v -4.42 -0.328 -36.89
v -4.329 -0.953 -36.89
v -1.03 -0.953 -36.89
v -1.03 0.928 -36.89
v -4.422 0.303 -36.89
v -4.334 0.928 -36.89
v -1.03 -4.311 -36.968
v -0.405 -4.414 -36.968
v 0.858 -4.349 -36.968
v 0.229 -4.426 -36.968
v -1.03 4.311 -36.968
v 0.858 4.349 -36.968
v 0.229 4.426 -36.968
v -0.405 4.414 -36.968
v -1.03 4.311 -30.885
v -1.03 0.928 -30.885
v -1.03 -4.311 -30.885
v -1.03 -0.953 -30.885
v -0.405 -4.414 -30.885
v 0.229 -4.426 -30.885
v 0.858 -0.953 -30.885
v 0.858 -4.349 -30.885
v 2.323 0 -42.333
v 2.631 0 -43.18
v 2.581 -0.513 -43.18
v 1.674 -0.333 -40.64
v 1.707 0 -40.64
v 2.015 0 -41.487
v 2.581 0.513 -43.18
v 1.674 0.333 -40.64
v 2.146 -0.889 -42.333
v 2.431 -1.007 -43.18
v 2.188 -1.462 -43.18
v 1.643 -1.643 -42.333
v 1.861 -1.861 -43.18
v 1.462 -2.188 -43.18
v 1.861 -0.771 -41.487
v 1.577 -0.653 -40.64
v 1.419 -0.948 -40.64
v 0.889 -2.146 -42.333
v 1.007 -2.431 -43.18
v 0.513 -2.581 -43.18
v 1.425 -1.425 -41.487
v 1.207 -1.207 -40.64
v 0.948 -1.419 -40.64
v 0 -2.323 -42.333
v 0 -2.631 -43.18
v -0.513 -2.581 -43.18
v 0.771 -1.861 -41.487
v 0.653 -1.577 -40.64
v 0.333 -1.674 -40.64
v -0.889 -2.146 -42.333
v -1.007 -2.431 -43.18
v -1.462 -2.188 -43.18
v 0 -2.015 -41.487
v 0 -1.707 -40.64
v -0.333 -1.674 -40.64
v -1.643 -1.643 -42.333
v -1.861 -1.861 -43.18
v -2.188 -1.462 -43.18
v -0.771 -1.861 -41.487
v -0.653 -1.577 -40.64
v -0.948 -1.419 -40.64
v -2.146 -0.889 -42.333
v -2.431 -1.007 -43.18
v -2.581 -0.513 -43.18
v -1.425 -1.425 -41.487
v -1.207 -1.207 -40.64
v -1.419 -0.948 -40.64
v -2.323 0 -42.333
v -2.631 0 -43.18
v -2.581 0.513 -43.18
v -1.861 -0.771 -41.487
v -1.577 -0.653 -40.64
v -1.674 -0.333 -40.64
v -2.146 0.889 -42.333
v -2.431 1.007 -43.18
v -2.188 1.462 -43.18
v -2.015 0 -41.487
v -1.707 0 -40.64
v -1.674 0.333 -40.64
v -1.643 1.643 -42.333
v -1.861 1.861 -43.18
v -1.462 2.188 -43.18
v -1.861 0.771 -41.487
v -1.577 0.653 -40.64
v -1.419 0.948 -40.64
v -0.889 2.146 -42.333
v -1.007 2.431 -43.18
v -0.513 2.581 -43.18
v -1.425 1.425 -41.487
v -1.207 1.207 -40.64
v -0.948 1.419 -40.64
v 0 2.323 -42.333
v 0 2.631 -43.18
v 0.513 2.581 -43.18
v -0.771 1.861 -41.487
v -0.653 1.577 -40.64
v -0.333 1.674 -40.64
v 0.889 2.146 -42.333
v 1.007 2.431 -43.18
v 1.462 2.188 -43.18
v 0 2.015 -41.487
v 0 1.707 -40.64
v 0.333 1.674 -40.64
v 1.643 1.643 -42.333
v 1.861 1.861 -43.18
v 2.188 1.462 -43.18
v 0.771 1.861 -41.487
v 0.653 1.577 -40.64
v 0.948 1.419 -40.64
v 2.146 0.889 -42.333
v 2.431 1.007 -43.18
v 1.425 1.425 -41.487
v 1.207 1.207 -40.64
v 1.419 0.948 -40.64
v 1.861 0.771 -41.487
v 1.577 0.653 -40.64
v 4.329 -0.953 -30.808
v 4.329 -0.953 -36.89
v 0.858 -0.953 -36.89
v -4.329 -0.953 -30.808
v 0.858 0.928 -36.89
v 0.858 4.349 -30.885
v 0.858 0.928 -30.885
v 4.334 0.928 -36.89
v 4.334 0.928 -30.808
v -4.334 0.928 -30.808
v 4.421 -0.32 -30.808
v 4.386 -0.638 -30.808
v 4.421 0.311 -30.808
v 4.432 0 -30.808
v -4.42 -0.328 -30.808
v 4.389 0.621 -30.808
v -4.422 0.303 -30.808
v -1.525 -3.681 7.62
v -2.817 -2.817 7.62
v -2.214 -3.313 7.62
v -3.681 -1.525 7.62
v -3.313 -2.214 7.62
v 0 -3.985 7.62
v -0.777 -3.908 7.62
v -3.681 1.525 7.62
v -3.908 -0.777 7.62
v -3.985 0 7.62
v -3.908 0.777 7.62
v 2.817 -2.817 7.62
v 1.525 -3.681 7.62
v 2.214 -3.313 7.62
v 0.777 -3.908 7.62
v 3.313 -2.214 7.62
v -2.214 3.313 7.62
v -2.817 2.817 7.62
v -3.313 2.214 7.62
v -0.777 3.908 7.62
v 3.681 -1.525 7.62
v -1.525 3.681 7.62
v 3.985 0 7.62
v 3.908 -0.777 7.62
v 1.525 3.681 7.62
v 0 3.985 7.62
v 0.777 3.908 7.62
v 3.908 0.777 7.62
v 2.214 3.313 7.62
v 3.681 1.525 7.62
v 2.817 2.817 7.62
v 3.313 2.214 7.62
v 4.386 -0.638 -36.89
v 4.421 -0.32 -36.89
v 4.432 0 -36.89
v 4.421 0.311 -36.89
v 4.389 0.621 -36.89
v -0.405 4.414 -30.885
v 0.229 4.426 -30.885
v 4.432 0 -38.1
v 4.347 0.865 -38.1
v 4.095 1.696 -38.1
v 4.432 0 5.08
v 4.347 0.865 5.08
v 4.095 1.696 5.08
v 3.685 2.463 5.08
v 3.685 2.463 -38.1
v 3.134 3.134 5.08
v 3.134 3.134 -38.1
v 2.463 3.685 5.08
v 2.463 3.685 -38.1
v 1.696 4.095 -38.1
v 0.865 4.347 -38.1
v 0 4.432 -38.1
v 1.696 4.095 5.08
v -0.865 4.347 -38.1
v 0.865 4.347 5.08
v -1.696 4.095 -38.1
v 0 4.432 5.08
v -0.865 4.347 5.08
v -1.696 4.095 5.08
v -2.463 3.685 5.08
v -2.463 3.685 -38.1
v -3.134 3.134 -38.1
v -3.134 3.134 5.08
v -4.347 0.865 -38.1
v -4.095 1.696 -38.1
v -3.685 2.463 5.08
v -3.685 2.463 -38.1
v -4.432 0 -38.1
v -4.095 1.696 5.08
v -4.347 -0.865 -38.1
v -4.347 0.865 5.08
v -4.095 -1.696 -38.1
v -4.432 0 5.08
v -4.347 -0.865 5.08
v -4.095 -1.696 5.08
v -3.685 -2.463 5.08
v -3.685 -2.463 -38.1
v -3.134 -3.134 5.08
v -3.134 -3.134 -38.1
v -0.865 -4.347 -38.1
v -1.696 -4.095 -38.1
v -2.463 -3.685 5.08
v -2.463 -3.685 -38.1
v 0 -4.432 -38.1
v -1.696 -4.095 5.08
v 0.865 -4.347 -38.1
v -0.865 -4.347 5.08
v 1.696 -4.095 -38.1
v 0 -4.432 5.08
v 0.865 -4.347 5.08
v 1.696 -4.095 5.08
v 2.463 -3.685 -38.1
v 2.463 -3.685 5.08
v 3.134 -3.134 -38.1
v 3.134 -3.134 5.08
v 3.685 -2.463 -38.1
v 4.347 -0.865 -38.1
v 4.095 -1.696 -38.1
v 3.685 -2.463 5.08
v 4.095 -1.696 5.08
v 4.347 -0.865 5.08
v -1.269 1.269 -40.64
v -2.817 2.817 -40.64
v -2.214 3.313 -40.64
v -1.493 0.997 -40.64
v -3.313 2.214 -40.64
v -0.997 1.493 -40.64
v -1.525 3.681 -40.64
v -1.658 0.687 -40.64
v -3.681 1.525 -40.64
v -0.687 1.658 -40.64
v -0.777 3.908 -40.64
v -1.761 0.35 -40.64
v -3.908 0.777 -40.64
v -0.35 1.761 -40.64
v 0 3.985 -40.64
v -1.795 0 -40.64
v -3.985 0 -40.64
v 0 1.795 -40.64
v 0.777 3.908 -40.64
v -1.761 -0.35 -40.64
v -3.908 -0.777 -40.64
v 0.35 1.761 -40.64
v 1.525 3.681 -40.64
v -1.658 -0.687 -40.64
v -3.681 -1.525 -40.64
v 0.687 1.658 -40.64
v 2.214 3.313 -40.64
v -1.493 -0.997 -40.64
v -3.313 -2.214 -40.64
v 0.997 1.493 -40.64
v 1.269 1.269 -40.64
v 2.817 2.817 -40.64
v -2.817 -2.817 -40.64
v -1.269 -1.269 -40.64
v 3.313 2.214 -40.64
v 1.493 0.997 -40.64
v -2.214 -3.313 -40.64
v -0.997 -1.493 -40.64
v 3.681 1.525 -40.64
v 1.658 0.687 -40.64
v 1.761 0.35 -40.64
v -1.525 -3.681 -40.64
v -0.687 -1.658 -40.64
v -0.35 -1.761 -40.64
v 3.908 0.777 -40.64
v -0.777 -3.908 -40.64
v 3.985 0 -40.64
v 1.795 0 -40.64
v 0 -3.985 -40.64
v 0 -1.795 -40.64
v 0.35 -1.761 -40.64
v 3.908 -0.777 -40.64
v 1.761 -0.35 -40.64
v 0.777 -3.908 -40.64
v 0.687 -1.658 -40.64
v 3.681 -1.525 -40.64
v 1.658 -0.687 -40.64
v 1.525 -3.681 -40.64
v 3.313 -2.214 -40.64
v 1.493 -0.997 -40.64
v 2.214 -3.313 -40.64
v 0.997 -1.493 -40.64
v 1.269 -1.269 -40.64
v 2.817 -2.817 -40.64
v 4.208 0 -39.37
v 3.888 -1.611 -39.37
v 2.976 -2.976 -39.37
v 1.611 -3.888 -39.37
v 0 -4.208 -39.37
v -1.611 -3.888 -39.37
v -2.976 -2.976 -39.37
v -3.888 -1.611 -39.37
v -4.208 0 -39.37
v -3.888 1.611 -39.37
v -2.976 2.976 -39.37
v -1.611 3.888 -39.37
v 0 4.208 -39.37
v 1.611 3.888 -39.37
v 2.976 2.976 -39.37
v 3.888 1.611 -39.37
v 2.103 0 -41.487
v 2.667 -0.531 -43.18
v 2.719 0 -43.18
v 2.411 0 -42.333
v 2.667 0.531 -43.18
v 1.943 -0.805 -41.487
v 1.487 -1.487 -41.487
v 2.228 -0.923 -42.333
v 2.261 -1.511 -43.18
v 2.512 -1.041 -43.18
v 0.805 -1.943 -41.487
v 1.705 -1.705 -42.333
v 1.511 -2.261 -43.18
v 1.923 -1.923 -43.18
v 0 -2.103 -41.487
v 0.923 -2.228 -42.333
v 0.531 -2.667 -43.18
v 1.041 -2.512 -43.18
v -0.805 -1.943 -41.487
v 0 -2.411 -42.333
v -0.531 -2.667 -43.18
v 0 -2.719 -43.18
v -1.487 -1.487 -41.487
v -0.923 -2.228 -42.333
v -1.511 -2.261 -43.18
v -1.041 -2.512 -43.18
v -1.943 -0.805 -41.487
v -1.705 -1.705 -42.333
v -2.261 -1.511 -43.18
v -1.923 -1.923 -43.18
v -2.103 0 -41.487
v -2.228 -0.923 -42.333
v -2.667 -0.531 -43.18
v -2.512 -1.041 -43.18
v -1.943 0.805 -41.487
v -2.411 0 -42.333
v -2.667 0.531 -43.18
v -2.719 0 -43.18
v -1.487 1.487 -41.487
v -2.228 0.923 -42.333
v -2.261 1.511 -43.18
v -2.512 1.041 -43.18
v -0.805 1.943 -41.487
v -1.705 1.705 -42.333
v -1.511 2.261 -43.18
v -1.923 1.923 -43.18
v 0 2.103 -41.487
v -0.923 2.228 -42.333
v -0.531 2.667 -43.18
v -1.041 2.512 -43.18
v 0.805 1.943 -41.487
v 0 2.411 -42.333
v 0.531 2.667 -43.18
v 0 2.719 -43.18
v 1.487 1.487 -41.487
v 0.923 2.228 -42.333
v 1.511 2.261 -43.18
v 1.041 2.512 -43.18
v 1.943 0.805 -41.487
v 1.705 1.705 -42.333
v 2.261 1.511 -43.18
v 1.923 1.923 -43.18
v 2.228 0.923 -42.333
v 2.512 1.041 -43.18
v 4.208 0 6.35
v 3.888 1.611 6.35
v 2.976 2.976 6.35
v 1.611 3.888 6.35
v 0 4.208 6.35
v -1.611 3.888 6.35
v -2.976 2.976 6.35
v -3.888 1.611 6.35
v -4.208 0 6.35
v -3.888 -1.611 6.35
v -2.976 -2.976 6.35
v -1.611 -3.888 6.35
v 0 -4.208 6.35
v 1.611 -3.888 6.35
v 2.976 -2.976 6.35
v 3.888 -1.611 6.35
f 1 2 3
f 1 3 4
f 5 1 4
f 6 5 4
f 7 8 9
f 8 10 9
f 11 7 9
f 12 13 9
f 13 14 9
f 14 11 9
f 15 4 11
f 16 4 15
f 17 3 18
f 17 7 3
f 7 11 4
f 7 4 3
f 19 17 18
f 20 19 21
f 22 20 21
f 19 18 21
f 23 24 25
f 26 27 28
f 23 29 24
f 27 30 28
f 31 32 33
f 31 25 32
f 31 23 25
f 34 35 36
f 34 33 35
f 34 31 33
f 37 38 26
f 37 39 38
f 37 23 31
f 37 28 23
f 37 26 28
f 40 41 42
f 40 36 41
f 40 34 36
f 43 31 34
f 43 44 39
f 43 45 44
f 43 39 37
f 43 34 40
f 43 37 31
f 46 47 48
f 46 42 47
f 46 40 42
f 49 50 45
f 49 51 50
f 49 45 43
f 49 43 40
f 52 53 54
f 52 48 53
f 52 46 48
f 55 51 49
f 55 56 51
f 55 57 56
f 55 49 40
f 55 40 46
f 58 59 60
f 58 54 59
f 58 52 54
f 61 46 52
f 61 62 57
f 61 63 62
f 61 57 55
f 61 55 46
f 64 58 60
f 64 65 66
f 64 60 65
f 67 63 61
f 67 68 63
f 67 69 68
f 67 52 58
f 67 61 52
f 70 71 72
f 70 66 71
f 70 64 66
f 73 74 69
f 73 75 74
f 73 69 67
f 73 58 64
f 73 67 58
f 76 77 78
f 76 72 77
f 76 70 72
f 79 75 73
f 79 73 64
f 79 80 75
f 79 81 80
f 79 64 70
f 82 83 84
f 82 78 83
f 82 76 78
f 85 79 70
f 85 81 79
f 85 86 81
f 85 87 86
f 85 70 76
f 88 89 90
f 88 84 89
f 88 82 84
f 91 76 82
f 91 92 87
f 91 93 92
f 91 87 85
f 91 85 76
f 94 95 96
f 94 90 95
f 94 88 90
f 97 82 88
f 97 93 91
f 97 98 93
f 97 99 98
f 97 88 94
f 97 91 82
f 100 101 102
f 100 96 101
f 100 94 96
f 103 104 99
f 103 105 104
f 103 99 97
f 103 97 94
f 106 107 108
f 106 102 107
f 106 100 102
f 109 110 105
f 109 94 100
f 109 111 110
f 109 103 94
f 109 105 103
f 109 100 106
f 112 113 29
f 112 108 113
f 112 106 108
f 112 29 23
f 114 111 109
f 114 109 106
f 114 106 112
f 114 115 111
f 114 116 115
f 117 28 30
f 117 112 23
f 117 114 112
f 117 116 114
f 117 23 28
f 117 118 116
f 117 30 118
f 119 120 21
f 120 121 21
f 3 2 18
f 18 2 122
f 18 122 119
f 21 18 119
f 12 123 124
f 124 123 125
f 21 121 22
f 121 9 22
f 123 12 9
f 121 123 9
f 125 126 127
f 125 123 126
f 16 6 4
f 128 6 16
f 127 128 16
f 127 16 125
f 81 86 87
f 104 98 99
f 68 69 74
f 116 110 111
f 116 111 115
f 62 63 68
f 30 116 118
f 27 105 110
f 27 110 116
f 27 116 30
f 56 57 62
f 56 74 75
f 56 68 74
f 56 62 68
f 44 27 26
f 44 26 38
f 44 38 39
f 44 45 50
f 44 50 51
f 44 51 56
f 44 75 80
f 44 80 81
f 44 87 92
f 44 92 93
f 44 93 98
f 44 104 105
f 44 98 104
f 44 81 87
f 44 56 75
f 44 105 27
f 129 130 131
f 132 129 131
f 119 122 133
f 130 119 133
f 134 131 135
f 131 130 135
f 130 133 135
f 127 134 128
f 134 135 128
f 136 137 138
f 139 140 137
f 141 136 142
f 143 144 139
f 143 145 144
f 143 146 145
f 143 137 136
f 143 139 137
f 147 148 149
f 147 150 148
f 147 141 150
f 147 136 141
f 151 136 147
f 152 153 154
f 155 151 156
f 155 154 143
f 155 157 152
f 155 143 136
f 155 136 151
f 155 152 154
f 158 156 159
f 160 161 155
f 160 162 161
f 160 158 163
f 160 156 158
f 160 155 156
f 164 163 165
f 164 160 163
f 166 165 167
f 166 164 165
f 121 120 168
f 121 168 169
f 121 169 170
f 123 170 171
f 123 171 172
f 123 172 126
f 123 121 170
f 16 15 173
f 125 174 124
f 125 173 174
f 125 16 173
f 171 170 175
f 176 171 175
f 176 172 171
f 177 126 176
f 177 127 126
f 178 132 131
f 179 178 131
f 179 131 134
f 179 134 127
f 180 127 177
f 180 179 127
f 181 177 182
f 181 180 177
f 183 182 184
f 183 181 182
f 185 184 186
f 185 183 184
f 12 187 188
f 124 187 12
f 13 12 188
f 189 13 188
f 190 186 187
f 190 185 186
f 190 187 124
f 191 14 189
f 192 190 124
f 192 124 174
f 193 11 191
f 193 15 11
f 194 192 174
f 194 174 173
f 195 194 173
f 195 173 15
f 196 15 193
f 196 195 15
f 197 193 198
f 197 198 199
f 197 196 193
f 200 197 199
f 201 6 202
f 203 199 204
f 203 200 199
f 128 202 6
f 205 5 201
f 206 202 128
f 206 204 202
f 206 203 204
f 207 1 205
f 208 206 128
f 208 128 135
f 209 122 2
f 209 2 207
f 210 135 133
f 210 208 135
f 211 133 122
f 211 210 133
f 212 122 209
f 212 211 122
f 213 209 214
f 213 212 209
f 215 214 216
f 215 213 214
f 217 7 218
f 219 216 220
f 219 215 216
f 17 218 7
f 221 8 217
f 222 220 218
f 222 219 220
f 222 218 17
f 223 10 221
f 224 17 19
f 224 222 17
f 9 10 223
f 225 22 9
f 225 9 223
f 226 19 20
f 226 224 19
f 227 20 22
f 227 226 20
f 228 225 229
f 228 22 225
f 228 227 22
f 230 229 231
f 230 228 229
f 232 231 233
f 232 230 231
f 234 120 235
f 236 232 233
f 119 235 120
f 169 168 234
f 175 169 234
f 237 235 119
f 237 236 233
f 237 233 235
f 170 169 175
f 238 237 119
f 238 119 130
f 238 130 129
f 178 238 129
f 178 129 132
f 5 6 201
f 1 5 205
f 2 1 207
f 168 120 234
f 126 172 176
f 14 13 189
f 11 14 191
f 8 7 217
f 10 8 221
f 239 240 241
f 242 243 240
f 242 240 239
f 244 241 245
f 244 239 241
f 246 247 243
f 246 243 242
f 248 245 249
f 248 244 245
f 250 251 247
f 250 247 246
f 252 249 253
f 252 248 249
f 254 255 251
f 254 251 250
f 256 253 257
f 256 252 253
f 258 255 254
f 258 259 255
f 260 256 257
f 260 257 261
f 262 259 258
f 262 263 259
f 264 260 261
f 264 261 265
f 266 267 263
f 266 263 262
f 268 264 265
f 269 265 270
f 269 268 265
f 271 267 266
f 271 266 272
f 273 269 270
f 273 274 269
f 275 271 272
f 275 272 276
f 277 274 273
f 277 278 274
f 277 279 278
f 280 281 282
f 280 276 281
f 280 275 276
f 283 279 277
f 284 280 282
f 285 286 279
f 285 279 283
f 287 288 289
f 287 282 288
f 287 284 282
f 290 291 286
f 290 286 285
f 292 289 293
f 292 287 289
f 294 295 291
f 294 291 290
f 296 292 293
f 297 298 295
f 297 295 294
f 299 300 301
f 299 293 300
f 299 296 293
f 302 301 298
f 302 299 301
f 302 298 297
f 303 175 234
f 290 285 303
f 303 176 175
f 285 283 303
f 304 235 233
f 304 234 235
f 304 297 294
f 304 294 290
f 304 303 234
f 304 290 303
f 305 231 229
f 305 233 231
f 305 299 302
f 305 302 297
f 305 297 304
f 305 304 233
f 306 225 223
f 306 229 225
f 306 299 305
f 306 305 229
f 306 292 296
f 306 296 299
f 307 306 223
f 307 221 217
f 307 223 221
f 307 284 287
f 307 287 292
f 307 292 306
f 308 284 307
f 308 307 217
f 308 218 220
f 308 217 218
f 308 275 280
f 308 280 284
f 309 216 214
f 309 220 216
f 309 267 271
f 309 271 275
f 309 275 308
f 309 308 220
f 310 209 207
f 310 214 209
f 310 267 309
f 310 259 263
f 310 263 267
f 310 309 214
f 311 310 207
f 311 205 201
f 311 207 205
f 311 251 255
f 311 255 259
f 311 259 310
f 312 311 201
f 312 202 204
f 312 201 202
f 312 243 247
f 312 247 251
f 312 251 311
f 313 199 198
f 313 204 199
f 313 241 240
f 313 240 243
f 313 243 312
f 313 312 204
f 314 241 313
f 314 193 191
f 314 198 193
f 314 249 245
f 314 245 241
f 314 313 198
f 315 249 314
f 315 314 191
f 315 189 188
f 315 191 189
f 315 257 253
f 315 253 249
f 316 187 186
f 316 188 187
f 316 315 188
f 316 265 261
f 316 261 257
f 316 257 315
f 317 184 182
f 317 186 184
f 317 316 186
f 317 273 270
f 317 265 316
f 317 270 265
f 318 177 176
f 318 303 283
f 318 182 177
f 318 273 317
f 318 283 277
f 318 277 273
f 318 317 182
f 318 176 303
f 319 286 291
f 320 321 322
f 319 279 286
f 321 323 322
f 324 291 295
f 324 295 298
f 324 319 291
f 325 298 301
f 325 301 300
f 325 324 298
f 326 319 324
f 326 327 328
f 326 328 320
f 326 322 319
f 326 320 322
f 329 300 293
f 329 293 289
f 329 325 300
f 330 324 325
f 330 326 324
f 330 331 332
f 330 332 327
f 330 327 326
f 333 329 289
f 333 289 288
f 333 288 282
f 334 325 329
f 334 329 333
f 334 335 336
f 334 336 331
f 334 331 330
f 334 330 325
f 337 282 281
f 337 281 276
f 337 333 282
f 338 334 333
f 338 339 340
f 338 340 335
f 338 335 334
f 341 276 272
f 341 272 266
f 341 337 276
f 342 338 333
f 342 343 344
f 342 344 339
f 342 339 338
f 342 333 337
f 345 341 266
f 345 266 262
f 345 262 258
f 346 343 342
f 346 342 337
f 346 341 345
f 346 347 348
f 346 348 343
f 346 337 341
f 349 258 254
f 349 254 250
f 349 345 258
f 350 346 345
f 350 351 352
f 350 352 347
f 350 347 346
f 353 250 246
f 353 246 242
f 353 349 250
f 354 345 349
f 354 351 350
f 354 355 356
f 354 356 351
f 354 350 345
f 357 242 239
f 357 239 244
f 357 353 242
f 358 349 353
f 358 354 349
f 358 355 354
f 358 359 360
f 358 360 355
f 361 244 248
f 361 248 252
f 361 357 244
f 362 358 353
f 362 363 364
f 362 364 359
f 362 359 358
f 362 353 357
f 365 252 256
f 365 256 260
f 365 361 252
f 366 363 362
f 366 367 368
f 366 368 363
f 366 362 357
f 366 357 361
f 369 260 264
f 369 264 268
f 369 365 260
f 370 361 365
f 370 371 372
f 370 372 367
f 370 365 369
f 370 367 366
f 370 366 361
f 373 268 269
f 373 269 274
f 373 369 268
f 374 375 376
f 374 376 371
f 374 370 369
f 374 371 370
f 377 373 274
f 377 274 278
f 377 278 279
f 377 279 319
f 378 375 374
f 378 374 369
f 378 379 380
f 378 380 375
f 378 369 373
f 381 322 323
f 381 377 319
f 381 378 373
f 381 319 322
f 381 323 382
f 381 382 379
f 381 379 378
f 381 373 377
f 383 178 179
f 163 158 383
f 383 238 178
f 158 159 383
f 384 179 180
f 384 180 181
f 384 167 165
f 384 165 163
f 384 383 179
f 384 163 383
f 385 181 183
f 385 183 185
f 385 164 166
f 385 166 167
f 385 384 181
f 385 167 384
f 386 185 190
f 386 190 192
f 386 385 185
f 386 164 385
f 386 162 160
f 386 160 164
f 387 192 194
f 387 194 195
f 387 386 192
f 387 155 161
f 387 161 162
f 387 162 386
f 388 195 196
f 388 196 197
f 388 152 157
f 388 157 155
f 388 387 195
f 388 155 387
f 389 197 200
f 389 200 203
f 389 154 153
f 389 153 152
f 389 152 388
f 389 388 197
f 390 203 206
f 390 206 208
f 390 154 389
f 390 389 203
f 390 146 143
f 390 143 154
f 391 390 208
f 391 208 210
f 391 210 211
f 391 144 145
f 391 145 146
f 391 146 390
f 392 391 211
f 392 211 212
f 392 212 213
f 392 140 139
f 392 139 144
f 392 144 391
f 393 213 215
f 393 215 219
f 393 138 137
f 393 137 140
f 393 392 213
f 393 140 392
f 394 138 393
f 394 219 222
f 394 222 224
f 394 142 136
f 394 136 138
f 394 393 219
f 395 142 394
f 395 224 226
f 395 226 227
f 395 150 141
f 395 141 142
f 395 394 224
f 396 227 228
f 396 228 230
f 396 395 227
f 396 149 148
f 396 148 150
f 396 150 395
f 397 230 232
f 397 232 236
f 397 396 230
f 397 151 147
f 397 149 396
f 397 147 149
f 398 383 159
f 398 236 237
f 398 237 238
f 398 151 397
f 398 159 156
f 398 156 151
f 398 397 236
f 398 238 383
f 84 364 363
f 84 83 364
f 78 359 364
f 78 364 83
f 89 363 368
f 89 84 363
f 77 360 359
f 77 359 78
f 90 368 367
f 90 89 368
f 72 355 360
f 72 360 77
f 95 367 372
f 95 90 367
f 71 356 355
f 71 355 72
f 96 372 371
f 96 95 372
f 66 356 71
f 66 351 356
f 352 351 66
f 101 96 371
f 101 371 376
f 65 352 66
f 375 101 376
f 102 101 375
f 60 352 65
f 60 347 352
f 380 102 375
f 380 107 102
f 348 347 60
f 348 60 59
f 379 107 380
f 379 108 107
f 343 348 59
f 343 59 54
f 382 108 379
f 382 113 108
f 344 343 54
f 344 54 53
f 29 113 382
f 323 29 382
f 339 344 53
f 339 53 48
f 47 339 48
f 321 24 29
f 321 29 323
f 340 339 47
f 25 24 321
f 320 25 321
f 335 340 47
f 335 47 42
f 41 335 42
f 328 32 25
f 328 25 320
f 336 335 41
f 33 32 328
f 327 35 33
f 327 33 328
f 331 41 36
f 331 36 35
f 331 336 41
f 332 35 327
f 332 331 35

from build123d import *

# Parameters (mm, degrees)
F0_R           = 4.4323867957
F1_DEPTH       = 5.08
F1_DEPTH_BACK  = 38.1
F1_FACE_R      = 4.4323867957
F2_DEPTH       = 2.54
F2_TAPER       = 10
F1_FACE1_R     = 4.4323867957
F3_DEPTH       = 2.54
F3_TAPER       = 10
F4_R           = 1.7950151947
F5_DEPTH       = 2.54
F5_TAPER       = -20
F6_R           = 2.6311933972
F7_DEPTH       = 2.54
F7_TAPER       = 20
F8_W           = 1.8805181608
F8_H           = 6.0816761106
F9_DEPTH       = 25.4
F9_DEPTH_BACK  = 25.4
F10_W          = 1.8878498813
F10_H          = 6.0830730945
F11_DEPTH      = 25.4
F11_DEPTH_BACK = 25.4


with BuildPart() as f1:
    # F0 (on Top) → F1 (new body, two sides)
    with BuildSketch(Plane.XY) as f1_sk:
        Circle(F0_R)
    extrude(amount=F1_DEPTH)
    extrude(f1_sk.sketch, amount=-F1_DEPTH_BACK)

    # F1_face (on face) → F2 (join)
    with BuildSketch(Plane(origin=(0, 0, -38.1), x_dir=(1, 0, 0), z_dir=(0, 0, -1))):
        Circle(F1_FACE_R)
    extrude(amount=F2_DEPTH, taper=F2_TAPER)

    # F1_face1 (on face) → F3 (join)
    with BuildSketch(Plane.XY.offset(5.08)):
        Circle(F1_FACE1_R)
    extrude(amount=F3_DEPTH, taper=F3_TAPER)

    # F4 (on face) → F5 (join)
    with BuildSketch(Plane(origin=(0, 0, -40.64), x_dir=(1, 0, 0), z_dir=(0, 0, -1))):
        Circle(F4_R)
    extrude(amount=F5_DEPTH, taper=F5_TAPER)

    # F6 (on face) → F7 (cut)
    with BuildSketch(Plane(origin=(0, 0, -43.18), x_dir=(1, 0, 0), z_dir=(0, 0, -1))):
        Circle(F6_R)
    extrude(amount=-F7_DEPTH, taper=F7_TAPER, mode=Mode.SUBTRACT)

    # F8 (on Right) → F9 (cut, two sides)
    with BuildSketch(Plane.YZ) as f9_sk:
        with Locations((-0.0123365317, -33.8487112895)):
            Rectangle(F8_W, F8_H)
    extrude(amount=-F9_DEPTH, mode=Mode.SUBTRACT)
    extrude(f9_sk.sketch, amount=F9_DEPTH_BACK, mode=Mode.SUBTRACT)

    # F10 (on Front) → F11 (cut, two sides)
    with BuildSketch(Plane.XZ) as f11_sk:
        with Locations((-0.0861281878, -33.9269181713)):
            Rectangle(F10_W, F10_H)
    extrude(amount=-F11_DEPTH, mode=Mode.SUBTRACT)
    extrude(f11_sk.sketch, amount=F11_DEPTH_BACK, mode=Mode.SUBTRACT)


solid = f1.part
